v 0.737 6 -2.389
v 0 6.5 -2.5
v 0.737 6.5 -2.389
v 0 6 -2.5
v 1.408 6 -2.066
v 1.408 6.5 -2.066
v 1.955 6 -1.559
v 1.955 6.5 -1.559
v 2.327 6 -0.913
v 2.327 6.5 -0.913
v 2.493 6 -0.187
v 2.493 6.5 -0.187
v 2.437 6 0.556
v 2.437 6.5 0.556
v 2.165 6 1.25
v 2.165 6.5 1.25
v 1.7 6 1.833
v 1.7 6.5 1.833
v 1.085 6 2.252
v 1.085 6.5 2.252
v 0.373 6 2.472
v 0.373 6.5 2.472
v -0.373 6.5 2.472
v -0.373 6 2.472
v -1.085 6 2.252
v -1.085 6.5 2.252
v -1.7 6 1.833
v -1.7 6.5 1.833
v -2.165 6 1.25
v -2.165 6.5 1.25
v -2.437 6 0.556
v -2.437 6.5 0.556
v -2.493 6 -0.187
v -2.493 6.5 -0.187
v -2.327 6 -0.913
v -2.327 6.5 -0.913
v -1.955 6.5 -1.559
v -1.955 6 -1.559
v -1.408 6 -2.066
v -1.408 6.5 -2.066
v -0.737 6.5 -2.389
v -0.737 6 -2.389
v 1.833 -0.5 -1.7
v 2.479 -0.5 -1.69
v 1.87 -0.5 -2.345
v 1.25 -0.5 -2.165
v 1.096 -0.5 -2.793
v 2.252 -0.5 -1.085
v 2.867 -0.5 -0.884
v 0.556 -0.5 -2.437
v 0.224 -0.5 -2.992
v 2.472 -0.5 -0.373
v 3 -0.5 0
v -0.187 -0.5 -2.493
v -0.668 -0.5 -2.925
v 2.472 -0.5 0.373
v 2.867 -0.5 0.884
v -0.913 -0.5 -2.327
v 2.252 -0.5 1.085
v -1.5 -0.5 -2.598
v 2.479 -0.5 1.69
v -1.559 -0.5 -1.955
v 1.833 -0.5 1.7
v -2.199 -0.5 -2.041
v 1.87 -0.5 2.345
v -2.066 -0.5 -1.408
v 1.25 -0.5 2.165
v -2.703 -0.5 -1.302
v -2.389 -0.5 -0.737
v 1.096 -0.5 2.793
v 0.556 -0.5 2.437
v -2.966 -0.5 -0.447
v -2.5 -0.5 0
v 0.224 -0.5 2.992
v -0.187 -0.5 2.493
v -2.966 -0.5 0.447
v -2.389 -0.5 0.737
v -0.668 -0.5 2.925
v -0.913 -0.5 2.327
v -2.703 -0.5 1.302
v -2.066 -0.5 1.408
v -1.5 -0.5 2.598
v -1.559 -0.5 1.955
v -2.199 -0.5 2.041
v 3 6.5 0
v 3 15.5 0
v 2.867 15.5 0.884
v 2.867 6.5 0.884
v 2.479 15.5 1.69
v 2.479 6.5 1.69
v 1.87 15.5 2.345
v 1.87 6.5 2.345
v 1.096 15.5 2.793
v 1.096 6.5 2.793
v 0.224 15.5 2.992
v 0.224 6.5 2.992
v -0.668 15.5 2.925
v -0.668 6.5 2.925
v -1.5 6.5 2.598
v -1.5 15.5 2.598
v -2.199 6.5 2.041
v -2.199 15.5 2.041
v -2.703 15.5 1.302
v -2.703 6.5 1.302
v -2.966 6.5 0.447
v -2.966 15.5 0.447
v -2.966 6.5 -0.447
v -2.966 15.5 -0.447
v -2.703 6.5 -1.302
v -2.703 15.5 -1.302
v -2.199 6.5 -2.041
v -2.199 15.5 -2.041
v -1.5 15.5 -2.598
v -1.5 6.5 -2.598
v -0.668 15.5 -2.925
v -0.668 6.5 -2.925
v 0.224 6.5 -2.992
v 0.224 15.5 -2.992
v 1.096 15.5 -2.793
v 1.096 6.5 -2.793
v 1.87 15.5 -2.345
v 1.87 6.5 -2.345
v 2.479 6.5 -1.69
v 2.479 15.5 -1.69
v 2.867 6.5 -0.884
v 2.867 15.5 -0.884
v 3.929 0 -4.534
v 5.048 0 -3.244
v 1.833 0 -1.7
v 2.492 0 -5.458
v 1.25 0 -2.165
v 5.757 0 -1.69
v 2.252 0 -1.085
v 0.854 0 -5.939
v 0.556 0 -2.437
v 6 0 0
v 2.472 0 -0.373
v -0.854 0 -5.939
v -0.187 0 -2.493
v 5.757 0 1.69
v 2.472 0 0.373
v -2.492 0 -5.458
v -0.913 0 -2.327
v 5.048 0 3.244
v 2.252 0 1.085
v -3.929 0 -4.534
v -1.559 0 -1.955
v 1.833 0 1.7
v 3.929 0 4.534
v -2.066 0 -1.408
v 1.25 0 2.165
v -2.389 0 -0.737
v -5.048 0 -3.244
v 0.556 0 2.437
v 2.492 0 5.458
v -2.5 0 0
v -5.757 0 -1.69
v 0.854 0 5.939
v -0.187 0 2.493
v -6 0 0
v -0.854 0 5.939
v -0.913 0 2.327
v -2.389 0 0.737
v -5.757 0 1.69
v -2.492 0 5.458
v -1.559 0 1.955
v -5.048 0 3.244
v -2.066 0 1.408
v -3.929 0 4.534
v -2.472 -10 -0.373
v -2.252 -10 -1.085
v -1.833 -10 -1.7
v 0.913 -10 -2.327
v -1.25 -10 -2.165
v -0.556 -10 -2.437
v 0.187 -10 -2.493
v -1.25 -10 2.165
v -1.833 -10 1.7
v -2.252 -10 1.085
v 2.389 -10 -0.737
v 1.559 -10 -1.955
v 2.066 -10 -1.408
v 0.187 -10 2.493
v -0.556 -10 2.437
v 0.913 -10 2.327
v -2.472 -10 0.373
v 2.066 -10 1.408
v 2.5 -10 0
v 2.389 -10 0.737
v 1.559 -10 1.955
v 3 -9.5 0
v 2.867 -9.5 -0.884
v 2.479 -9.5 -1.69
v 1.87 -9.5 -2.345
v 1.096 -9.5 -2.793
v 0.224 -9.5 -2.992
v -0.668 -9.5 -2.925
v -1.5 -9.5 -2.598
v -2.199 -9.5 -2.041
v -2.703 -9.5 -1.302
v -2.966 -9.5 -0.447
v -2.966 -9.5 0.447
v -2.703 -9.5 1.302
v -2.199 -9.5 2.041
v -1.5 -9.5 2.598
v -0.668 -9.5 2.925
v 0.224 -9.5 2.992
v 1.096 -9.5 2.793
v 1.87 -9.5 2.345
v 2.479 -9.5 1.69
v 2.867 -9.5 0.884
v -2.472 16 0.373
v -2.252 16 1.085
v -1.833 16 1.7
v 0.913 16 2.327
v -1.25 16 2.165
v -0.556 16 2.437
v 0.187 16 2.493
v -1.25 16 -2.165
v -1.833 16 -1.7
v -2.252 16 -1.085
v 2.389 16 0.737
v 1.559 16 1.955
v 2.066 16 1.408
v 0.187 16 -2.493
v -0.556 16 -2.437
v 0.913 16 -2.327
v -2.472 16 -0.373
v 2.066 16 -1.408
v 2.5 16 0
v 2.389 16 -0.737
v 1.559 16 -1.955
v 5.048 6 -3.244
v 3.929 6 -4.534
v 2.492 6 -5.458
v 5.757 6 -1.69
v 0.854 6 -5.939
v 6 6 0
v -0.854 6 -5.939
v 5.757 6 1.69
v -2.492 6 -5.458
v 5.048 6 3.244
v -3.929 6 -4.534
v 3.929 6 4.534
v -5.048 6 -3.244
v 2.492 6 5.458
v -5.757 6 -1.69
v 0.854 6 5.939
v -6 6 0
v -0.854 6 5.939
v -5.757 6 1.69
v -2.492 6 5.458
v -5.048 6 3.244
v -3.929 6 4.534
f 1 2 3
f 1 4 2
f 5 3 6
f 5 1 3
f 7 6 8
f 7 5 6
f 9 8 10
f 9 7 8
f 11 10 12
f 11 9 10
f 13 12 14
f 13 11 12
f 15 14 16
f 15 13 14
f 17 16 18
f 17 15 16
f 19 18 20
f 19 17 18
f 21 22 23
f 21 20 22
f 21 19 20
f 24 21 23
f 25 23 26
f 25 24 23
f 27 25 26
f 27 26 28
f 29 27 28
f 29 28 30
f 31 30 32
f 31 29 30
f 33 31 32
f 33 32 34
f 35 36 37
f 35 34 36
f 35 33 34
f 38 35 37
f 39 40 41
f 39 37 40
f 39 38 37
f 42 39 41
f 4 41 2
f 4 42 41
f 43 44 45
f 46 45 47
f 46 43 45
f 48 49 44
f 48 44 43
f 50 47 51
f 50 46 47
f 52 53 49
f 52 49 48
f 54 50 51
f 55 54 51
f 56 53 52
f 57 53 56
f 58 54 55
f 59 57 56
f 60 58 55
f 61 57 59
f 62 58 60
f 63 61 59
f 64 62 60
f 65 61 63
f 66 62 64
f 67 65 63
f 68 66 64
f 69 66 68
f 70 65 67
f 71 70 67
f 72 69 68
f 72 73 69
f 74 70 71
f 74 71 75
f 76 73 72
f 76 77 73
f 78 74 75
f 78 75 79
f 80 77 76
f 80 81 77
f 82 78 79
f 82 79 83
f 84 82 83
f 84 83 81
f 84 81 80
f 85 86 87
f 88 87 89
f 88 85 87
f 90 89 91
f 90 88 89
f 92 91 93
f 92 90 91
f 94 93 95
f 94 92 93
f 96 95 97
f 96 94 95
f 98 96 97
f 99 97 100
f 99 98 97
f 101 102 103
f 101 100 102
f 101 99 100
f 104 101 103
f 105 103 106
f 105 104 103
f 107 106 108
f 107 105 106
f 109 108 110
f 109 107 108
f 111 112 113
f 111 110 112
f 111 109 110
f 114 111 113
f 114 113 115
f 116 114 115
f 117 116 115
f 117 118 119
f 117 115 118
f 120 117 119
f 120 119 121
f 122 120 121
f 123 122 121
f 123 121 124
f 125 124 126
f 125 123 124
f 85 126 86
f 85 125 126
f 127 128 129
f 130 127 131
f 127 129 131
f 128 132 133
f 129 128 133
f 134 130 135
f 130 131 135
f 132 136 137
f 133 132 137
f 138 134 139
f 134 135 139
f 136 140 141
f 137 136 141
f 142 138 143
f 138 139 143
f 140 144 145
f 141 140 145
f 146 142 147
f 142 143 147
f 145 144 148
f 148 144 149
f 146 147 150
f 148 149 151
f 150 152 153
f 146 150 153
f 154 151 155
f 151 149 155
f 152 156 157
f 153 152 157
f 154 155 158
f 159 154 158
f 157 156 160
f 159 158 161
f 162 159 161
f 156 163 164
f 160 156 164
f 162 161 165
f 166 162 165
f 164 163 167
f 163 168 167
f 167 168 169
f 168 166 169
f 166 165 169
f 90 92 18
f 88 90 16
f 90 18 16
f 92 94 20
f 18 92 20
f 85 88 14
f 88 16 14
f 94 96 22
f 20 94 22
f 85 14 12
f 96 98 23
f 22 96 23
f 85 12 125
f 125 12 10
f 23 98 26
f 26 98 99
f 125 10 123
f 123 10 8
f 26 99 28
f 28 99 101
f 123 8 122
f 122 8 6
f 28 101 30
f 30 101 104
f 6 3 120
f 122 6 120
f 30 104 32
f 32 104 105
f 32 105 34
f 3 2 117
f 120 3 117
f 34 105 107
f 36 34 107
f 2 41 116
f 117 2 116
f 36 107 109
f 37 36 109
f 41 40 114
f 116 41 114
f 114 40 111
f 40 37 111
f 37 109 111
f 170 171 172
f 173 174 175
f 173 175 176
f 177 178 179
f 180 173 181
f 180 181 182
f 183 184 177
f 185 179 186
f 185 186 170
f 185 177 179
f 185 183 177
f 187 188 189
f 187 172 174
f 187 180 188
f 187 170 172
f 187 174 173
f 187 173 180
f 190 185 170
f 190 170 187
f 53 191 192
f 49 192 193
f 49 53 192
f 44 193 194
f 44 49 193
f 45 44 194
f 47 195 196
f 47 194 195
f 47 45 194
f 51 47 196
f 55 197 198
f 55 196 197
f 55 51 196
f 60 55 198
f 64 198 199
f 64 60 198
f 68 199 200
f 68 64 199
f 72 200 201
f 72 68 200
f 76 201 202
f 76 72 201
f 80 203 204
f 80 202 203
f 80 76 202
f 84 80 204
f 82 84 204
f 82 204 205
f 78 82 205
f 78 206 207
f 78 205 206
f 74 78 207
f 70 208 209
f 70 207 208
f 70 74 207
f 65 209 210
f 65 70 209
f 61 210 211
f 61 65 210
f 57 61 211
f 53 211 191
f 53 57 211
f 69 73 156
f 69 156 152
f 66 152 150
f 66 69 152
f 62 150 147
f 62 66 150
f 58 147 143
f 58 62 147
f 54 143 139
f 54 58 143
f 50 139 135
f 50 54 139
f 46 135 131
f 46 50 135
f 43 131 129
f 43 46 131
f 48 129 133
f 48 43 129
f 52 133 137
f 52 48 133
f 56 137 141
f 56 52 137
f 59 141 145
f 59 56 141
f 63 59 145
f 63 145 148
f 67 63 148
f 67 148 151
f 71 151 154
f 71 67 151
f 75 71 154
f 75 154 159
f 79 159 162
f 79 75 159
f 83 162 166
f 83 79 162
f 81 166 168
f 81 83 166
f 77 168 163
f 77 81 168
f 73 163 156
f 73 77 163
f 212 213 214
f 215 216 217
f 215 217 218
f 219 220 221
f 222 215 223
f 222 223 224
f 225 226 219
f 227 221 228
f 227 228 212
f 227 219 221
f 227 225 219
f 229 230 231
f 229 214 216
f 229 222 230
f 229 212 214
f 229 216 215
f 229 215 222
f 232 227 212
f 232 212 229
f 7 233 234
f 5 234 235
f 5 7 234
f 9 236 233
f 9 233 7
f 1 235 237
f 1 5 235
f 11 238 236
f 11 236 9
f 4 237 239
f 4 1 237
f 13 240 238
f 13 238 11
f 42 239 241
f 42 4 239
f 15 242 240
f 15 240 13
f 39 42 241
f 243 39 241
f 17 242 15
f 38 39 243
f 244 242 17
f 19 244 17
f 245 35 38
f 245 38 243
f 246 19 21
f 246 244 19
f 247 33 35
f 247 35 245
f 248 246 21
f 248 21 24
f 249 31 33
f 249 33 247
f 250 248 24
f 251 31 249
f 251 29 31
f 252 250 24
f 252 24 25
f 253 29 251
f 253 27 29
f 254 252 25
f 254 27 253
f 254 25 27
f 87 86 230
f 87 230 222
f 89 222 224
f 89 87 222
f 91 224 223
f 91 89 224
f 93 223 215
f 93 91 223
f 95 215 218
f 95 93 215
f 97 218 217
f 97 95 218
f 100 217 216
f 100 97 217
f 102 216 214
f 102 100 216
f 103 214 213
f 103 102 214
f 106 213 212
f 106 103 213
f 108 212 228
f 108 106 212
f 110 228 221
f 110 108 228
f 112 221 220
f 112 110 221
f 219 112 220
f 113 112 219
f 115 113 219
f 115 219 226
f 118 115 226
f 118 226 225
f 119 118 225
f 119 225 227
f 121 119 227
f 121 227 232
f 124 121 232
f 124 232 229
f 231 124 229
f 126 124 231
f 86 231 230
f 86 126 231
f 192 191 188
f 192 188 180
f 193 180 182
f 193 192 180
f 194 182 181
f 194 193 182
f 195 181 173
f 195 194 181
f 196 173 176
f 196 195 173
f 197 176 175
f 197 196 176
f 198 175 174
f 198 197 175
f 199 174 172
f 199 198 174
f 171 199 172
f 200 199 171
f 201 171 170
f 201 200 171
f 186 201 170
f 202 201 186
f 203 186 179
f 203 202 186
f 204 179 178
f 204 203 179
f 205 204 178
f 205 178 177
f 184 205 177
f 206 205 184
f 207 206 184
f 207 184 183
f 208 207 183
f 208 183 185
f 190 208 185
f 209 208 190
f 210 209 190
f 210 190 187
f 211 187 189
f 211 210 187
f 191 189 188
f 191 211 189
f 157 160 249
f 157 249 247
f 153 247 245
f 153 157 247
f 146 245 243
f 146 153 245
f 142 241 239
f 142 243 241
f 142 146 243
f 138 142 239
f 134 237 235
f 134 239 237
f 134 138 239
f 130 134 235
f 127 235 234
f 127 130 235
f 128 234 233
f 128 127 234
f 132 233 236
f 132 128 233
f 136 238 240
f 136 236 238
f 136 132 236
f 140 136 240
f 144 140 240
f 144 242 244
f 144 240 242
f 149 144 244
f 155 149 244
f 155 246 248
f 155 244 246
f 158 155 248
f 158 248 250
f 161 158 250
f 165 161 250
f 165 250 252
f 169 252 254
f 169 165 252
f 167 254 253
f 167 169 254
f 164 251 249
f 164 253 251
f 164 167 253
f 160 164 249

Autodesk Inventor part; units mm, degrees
ref_plane "YZ Plane" through (0, 0, 0) normal (1, 0, 0) x (0, 1, 0)
ref_plane "XZ Plane" through (0, 0, 0) normal (0, 1, 0) x (-1, 0, 0)
ref_plane "XY Plane" through (0, 0, 0) normal (0, 0, 1) x (1, 0, 0)
sketch "Sketch1" plane through (0, 0, 0) normal (0, 1, 0) x (-1, 0, 0)
  circle A0 centre (0, 0) radius 6
  dimension "d0" = 12
extrude "srodek" add sketch "Sketch1" along normal blind 6
sketch "Sketch2" plane through (0, 0, 0) normal (0, -1, 0) x (1, 0, 0)
  circle A0 centre (0, 0) radius 6 projected
  circle A1 centre (0, 0) radius 3
  dimension "d3" = 6
extrude "dolne" add sketch "Sketch2" along normal blind 10 contours A1
thread "Thread1" size "M6x1" class "6g" standard "ANSI Metric M Profile" full length
chamfer "Chamfer1" distance 0.5 angle 45 1 edges at (-3, -10, 0)
sketch "Sketch3" plane through (0, 0, 0) normal (0, 0, 1) x (1, 0, 0)
  line L0 (3, 0) -> (-3, 0) projected
  line L1 (-3, 0) -> (-2.5, 0)
  line L2 (-2.5, 0) -> (-2.5, -0.5)
  line L3 (-2.5, -0.5) -> (-3, -0.5)
  line L4 (-3, -0.5) -> (-3, 0)
  line L5 (0, -0.6) -> (0, 0.1) projected
  point P0 (0, 0)
  point P1 (-2.5, 0)
  dimension "d11" = 0.5
  dimension "d12" = 0.5
revolve "Revolution1" cut sketch "Sketch3" angle 360 about axis through (0, -10, 0) along (0, 1, 0)
sketch "Sketch6" plane through (0, 6, 0) normal (0, 1, 0) x (1, 0, 0)
  circle A0 centre (0, 0) radius 4 projected
  circle A1 centre (0, 0) radius 3
  dimension "d19" = 6
extrude "mocowanie K1" add sketch "Sketch6" along normal blind 10 contours A1
sketch "Sketch7" plane through (0, 0, 0) normal (1, 0, 0) x (0, 1, 0)
  line L0 (6, -3) -> (6.5, -3)
  line L1 (6.5, -3) -> (6.5, -2.5)
  line L2 (6.5, -2.5) -> (6, -2.5)
  line L3 (6, -2.5) -> (6, -3)
  line L4 (-3.2, 0) -> (19.2, 0) projected
  line L5 (16, -3) -> (16, 3) construction
  line L6 (6, 3) -> (6, -3) construction
  point P0 (0, 0)
  dimension "d27" = 0.5
  dimension "d28" = 0.5
revolve "Revolution2" cut sketch "Sketch7" angle 360 about axis through (0, -10, 0) along (0, 1, 0)
thread "Thread3" size "M6x1" class "6g" standard "ISO Metric profile" full length
chamfer "Chamfer3" distance 0.5 angle 45 1 edges at (-3, 16, 0)
properties part number "KN-00-02-04" material "X5CrNi18-10"
